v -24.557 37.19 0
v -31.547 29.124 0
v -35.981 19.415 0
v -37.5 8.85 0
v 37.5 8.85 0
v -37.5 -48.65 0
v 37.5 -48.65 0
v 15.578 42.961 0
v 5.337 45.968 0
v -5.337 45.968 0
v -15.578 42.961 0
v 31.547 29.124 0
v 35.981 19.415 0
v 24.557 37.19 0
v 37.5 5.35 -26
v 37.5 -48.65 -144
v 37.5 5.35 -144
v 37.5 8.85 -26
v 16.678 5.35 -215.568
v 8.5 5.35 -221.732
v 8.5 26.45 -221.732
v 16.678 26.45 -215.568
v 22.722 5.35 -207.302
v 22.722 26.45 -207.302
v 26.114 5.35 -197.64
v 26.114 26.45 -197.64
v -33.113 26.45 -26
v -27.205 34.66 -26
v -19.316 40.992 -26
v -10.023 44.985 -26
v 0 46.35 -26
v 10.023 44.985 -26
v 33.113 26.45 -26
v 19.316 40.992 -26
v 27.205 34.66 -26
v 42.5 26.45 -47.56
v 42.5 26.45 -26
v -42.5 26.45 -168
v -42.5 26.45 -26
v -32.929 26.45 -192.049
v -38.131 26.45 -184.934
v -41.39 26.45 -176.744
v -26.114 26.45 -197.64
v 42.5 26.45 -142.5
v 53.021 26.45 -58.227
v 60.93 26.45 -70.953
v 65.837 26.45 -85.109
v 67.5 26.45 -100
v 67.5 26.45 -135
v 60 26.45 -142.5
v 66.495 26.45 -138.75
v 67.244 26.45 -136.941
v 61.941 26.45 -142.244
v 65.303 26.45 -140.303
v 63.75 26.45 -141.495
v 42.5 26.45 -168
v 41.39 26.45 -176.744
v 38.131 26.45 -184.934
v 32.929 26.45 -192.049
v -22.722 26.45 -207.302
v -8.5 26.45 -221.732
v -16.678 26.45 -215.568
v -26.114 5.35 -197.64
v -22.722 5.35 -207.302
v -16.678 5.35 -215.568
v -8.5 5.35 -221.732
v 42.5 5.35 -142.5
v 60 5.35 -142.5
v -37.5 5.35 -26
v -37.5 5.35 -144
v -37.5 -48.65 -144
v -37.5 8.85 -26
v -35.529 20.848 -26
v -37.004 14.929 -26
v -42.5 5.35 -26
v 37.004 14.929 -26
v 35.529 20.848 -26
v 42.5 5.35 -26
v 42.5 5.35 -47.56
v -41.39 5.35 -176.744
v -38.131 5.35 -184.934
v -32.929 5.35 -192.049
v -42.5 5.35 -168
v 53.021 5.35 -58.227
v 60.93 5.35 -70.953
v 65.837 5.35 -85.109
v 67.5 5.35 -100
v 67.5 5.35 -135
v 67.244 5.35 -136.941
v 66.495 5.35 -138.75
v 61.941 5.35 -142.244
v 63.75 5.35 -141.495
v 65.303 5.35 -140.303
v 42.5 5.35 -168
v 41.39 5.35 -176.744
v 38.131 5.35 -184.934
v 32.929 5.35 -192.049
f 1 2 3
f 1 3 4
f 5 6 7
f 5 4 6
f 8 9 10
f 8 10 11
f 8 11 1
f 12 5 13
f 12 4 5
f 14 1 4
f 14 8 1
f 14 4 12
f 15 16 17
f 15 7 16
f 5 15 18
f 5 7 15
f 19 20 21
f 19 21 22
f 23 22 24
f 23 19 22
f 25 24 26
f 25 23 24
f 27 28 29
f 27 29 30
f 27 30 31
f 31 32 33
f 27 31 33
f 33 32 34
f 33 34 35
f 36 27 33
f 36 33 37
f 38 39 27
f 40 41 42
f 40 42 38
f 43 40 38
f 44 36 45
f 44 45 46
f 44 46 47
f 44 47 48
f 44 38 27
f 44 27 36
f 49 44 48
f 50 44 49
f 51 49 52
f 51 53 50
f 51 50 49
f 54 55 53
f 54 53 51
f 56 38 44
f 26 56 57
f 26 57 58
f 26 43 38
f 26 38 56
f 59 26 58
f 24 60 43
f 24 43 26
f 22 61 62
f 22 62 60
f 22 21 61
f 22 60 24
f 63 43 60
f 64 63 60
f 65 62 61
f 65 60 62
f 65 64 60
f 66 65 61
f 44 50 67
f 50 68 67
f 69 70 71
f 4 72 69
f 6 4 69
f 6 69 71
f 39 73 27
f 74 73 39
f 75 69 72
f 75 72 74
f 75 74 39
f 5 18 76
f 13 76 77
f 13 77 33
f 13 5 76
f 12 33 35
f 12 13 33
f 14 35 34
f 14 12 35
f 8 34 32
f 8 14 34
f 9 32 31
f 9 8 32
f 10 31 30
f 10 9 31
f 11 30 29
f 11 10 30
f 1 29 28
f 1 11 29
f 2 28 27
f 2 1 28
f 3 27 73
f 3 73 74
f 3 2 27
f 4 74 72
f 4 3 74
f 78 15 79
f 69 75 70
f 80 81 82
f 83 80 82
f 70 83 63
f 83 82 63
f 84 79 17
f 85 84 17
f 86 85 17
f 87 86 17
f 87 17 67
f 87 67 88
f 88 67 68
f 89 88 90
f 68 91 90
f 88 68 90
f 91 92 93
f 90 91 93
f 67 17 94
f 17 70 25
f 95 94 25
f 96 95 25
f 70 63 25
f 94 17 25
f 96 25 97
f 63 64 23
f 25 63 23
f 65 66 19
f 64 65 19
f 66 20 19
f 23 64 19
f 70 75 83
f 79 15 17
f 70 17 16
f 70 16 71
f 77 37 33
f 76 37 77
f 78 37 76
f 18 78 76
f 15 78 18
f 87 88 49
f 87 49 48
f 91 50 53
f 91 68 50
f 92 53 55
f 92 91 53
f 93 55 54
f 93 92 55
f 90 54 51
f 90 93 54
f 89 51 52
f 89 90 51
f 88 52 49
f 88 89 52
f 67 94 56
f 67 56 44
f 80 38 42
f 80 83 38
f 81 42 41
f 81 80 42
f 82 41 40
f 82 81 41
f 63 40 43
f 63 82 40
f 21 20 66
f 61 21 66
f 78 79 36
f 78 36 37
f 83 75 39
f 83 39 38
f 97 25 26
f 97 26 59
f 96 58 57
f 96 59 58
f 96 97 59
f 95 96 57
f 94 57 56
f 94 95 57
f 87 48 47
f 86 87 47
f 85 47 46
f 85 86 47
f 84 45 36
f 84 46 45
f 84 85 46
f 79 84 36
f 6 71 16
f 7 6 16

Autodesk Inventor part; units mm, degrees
sketch "Sketch1" plane through (0, 0, 0) normal (0, 0, 1) x (1, 0, 0)
  arc A0 (-16, 36.5624) -> (16, 36.5624) centre (0, 8.8496) ccw projected
  line L0 (-16, 36.5624) -> (0, 45.8) projected
  line L1 (0, 45.8) -> (16, 36.5624) projected
  line L2 (37.5, 8.8496) -> (37.5, -28.6504) projected
  arc A1 (37.5, 8.8496) -> (-37.5, 8.8496) centre (0, 8.8496) ccw projected
  line L3 (-37.5, -28.6504) -> (-37.5, 8.8496) projected
  line L4 (37.5, -28.6504) -> (-37.5, -28.6504) projected
  line L5 (-37.5, -28.6504) -> (37.5, -28.6504)
  line L6 (37.5, -28.6504) -> (37.5, -48.6504)
  line L7 (37.5, -48.6504) -> (-37.5, -48.6504)
  line L8 (-37.5, -48.6504) -> (-37.5, -28.6504)
  point P0 (0, 0)
  dimension "d0" = 20
ref_plane "Work Plane1" through (-37.4166, 11.3496, -26) normal (0, 0, -1) x (0, 1, 0)
extrude "Extrusion1" add sketch "Sketch1" against normal up to surface (26 mm away) contours L0 L1 A0 | L2 L4 L3 A1 | L6 L7 L8 L4
sketch "Sketch2" plane through (0, 8.8496, -26) normal (0, 0, -1) x (-1, 0, 0)
  line L0 (-37.5, -57.5) -> (-37.5, 0) projected
  line L1 (37.5, -57.5) -> (-37.5, -57.5) projected
  line L2 (37.5, 0) -> (37.5, -57.5) projected
  line L3 (-37.5, -3.5) -> (-28.6182, -3.5) projected
  line L4 (-37.5, -57.5) -> (37.5, -57.5)
  line L5 (37.5, -57.5) -> (37.5, -3.5)
  line L6 (37.5, -3.5) -> (-37.5, -3.5)
  line L7 (-37.5, -3.5) -> (-37.5, -57.5)
  point P0 (0, -8.8496)
ref_plane "Work Plane2" through (-37.5, -28.6504, -144) normal (0, 0, -1) x (0, 1, 0)
extrude "Extrusion2" add sketch "Sketch2" along normal up to surface (118 mm away)
sketch "Sketch3" plane through (-37.5, 5.3496, -26) normal (0, 1, 0) x (1, 0, 0)
  line L0 (75, 118) -> (0, 118) projected
  line L1 (0, 0) -> (0, 118) projected
  line L2 (75, 0) -> (0, 0) projected
  line L3 (75, 0) -> (75, 118) projected
  line L4 (80, 0) -> (-5, 0)
  line L5 (-5, 0) -> (-5, 142)
  line L6 (-5, 142) -> (80, 142)
  line L7 (80, 142) -> (80, 0)
  line L8 (37.5, 0) -> (37.5, 165)
  arc A0 (72.5, 142) -> (2.5, 142) centre (37.5, 142) ccw construction
  arc A1 (80, 142) -> (45, 177) centre (45, 142) ccw
  arc A2 (30, 177) -> (-5, 142) centre (30, 142) ccw
  line L9 (45, 177) -> (30, 177)
  line L10 (64.25, 165) -> (10.75, 165)
  arc A3 (45.75, 200) -> (10.75, 165) centre (45.75, 165) ccw
  line L11 (45.75, 165) -> (45.75, 200) construction
  line L12 (45.75, 165) -> (10.75, 165) construction
  arc A4 (64.25, 165) -> (29.25, 200) centre (29.25, 165) ccw
  line L13 (29.25, 165) -> (29.25, 200) construction
  line L14 (29.25, 165) -> (64.25, 165) construction
  line L15 (46, 195.7317) -> (29, 195.7317)
  line L16 (37.5, 109) -> (97.5, 109) construction
  circle A5 centre (97.5, 109) radius 7.5 construction
  arc A6 (80, 56.5596) -> (105, 109) centre (37.5, 109) ccw construction
  line L17 (105, 109) -> (105, 74)
  arc A7 (80, 21.5596) -> (105, 74) centre (37.5, 74) ccw
  line L18 (97.5, 116.5) -> (80, 116.5)
  arc A8 (105, 109) -> (97.5, 116.5) centre (97.5, 109) ccw
  point P0 (37.5, -26)
  point P1 (37.5, 118)
  point P2 (37.5, 142)
  dimension "d5" = 5
  dimension "d6" = 5
  dimension "d7" = 24
  dimension "d8" = 35
  dimension "d9" = 35
  dimension "d10" = 35
  dimension "d11" = 47
  dimension "d12" = 53.5
  dimension "d13" = 90
  dimension "d14" = 90
  dimension "d15" = 35
  dimension "d16" = 35
  dimension "d17" = 17
  dimension "d26" = 15
  dimension "d27" = 60
  dimension "d28" = 109
  dimension "d29" = 35
ref_plane "Work Plane3" through (-7.5, 26.4496, -42.5) normal (0, 1, 0) x (0, 0, 1)
extrude "Extrusion3" add sketch "Sketch3" along normal up to surface (21.1 mm away) contours L3 L2 L8 L0 | L0 L8 L6 L7 L4 L3 | L8 L2 L1 L0 | L0 L1 L4 L5 L6 L8 | L8 L10 A4 A1 L6 | L6 A2 A3 L10 L8 | L10 A3 A2 L9 A1 A4 | L7 L18 A8 L17 A7 | A3 L15 A4 A1 L9 A2
ref_plane "Work Plane4" through (12.5, 5.3496, -168) normal (-1, 0, 0) x (0, 0, 1)
ref_plane "Work Plane6" through (0, -1.1504, 0) normal (0, -1, 0) x (1, 0, 0)
ref_plane "Work Plane5" through (0, 46.3496, 0) normal (0, -1, 0) x (1, 0, 0)
ref_plane "Work Plane7" through (0, 0, -110.8659) normal (0, 0, 1) x (1, 0, 0)
equation "\"d9\" = d8"
equation "\"d10\" = d8"
equation "\"d15\" = d8"
equation "\"d16\" = d8"
properties part number "Space Envelope"
